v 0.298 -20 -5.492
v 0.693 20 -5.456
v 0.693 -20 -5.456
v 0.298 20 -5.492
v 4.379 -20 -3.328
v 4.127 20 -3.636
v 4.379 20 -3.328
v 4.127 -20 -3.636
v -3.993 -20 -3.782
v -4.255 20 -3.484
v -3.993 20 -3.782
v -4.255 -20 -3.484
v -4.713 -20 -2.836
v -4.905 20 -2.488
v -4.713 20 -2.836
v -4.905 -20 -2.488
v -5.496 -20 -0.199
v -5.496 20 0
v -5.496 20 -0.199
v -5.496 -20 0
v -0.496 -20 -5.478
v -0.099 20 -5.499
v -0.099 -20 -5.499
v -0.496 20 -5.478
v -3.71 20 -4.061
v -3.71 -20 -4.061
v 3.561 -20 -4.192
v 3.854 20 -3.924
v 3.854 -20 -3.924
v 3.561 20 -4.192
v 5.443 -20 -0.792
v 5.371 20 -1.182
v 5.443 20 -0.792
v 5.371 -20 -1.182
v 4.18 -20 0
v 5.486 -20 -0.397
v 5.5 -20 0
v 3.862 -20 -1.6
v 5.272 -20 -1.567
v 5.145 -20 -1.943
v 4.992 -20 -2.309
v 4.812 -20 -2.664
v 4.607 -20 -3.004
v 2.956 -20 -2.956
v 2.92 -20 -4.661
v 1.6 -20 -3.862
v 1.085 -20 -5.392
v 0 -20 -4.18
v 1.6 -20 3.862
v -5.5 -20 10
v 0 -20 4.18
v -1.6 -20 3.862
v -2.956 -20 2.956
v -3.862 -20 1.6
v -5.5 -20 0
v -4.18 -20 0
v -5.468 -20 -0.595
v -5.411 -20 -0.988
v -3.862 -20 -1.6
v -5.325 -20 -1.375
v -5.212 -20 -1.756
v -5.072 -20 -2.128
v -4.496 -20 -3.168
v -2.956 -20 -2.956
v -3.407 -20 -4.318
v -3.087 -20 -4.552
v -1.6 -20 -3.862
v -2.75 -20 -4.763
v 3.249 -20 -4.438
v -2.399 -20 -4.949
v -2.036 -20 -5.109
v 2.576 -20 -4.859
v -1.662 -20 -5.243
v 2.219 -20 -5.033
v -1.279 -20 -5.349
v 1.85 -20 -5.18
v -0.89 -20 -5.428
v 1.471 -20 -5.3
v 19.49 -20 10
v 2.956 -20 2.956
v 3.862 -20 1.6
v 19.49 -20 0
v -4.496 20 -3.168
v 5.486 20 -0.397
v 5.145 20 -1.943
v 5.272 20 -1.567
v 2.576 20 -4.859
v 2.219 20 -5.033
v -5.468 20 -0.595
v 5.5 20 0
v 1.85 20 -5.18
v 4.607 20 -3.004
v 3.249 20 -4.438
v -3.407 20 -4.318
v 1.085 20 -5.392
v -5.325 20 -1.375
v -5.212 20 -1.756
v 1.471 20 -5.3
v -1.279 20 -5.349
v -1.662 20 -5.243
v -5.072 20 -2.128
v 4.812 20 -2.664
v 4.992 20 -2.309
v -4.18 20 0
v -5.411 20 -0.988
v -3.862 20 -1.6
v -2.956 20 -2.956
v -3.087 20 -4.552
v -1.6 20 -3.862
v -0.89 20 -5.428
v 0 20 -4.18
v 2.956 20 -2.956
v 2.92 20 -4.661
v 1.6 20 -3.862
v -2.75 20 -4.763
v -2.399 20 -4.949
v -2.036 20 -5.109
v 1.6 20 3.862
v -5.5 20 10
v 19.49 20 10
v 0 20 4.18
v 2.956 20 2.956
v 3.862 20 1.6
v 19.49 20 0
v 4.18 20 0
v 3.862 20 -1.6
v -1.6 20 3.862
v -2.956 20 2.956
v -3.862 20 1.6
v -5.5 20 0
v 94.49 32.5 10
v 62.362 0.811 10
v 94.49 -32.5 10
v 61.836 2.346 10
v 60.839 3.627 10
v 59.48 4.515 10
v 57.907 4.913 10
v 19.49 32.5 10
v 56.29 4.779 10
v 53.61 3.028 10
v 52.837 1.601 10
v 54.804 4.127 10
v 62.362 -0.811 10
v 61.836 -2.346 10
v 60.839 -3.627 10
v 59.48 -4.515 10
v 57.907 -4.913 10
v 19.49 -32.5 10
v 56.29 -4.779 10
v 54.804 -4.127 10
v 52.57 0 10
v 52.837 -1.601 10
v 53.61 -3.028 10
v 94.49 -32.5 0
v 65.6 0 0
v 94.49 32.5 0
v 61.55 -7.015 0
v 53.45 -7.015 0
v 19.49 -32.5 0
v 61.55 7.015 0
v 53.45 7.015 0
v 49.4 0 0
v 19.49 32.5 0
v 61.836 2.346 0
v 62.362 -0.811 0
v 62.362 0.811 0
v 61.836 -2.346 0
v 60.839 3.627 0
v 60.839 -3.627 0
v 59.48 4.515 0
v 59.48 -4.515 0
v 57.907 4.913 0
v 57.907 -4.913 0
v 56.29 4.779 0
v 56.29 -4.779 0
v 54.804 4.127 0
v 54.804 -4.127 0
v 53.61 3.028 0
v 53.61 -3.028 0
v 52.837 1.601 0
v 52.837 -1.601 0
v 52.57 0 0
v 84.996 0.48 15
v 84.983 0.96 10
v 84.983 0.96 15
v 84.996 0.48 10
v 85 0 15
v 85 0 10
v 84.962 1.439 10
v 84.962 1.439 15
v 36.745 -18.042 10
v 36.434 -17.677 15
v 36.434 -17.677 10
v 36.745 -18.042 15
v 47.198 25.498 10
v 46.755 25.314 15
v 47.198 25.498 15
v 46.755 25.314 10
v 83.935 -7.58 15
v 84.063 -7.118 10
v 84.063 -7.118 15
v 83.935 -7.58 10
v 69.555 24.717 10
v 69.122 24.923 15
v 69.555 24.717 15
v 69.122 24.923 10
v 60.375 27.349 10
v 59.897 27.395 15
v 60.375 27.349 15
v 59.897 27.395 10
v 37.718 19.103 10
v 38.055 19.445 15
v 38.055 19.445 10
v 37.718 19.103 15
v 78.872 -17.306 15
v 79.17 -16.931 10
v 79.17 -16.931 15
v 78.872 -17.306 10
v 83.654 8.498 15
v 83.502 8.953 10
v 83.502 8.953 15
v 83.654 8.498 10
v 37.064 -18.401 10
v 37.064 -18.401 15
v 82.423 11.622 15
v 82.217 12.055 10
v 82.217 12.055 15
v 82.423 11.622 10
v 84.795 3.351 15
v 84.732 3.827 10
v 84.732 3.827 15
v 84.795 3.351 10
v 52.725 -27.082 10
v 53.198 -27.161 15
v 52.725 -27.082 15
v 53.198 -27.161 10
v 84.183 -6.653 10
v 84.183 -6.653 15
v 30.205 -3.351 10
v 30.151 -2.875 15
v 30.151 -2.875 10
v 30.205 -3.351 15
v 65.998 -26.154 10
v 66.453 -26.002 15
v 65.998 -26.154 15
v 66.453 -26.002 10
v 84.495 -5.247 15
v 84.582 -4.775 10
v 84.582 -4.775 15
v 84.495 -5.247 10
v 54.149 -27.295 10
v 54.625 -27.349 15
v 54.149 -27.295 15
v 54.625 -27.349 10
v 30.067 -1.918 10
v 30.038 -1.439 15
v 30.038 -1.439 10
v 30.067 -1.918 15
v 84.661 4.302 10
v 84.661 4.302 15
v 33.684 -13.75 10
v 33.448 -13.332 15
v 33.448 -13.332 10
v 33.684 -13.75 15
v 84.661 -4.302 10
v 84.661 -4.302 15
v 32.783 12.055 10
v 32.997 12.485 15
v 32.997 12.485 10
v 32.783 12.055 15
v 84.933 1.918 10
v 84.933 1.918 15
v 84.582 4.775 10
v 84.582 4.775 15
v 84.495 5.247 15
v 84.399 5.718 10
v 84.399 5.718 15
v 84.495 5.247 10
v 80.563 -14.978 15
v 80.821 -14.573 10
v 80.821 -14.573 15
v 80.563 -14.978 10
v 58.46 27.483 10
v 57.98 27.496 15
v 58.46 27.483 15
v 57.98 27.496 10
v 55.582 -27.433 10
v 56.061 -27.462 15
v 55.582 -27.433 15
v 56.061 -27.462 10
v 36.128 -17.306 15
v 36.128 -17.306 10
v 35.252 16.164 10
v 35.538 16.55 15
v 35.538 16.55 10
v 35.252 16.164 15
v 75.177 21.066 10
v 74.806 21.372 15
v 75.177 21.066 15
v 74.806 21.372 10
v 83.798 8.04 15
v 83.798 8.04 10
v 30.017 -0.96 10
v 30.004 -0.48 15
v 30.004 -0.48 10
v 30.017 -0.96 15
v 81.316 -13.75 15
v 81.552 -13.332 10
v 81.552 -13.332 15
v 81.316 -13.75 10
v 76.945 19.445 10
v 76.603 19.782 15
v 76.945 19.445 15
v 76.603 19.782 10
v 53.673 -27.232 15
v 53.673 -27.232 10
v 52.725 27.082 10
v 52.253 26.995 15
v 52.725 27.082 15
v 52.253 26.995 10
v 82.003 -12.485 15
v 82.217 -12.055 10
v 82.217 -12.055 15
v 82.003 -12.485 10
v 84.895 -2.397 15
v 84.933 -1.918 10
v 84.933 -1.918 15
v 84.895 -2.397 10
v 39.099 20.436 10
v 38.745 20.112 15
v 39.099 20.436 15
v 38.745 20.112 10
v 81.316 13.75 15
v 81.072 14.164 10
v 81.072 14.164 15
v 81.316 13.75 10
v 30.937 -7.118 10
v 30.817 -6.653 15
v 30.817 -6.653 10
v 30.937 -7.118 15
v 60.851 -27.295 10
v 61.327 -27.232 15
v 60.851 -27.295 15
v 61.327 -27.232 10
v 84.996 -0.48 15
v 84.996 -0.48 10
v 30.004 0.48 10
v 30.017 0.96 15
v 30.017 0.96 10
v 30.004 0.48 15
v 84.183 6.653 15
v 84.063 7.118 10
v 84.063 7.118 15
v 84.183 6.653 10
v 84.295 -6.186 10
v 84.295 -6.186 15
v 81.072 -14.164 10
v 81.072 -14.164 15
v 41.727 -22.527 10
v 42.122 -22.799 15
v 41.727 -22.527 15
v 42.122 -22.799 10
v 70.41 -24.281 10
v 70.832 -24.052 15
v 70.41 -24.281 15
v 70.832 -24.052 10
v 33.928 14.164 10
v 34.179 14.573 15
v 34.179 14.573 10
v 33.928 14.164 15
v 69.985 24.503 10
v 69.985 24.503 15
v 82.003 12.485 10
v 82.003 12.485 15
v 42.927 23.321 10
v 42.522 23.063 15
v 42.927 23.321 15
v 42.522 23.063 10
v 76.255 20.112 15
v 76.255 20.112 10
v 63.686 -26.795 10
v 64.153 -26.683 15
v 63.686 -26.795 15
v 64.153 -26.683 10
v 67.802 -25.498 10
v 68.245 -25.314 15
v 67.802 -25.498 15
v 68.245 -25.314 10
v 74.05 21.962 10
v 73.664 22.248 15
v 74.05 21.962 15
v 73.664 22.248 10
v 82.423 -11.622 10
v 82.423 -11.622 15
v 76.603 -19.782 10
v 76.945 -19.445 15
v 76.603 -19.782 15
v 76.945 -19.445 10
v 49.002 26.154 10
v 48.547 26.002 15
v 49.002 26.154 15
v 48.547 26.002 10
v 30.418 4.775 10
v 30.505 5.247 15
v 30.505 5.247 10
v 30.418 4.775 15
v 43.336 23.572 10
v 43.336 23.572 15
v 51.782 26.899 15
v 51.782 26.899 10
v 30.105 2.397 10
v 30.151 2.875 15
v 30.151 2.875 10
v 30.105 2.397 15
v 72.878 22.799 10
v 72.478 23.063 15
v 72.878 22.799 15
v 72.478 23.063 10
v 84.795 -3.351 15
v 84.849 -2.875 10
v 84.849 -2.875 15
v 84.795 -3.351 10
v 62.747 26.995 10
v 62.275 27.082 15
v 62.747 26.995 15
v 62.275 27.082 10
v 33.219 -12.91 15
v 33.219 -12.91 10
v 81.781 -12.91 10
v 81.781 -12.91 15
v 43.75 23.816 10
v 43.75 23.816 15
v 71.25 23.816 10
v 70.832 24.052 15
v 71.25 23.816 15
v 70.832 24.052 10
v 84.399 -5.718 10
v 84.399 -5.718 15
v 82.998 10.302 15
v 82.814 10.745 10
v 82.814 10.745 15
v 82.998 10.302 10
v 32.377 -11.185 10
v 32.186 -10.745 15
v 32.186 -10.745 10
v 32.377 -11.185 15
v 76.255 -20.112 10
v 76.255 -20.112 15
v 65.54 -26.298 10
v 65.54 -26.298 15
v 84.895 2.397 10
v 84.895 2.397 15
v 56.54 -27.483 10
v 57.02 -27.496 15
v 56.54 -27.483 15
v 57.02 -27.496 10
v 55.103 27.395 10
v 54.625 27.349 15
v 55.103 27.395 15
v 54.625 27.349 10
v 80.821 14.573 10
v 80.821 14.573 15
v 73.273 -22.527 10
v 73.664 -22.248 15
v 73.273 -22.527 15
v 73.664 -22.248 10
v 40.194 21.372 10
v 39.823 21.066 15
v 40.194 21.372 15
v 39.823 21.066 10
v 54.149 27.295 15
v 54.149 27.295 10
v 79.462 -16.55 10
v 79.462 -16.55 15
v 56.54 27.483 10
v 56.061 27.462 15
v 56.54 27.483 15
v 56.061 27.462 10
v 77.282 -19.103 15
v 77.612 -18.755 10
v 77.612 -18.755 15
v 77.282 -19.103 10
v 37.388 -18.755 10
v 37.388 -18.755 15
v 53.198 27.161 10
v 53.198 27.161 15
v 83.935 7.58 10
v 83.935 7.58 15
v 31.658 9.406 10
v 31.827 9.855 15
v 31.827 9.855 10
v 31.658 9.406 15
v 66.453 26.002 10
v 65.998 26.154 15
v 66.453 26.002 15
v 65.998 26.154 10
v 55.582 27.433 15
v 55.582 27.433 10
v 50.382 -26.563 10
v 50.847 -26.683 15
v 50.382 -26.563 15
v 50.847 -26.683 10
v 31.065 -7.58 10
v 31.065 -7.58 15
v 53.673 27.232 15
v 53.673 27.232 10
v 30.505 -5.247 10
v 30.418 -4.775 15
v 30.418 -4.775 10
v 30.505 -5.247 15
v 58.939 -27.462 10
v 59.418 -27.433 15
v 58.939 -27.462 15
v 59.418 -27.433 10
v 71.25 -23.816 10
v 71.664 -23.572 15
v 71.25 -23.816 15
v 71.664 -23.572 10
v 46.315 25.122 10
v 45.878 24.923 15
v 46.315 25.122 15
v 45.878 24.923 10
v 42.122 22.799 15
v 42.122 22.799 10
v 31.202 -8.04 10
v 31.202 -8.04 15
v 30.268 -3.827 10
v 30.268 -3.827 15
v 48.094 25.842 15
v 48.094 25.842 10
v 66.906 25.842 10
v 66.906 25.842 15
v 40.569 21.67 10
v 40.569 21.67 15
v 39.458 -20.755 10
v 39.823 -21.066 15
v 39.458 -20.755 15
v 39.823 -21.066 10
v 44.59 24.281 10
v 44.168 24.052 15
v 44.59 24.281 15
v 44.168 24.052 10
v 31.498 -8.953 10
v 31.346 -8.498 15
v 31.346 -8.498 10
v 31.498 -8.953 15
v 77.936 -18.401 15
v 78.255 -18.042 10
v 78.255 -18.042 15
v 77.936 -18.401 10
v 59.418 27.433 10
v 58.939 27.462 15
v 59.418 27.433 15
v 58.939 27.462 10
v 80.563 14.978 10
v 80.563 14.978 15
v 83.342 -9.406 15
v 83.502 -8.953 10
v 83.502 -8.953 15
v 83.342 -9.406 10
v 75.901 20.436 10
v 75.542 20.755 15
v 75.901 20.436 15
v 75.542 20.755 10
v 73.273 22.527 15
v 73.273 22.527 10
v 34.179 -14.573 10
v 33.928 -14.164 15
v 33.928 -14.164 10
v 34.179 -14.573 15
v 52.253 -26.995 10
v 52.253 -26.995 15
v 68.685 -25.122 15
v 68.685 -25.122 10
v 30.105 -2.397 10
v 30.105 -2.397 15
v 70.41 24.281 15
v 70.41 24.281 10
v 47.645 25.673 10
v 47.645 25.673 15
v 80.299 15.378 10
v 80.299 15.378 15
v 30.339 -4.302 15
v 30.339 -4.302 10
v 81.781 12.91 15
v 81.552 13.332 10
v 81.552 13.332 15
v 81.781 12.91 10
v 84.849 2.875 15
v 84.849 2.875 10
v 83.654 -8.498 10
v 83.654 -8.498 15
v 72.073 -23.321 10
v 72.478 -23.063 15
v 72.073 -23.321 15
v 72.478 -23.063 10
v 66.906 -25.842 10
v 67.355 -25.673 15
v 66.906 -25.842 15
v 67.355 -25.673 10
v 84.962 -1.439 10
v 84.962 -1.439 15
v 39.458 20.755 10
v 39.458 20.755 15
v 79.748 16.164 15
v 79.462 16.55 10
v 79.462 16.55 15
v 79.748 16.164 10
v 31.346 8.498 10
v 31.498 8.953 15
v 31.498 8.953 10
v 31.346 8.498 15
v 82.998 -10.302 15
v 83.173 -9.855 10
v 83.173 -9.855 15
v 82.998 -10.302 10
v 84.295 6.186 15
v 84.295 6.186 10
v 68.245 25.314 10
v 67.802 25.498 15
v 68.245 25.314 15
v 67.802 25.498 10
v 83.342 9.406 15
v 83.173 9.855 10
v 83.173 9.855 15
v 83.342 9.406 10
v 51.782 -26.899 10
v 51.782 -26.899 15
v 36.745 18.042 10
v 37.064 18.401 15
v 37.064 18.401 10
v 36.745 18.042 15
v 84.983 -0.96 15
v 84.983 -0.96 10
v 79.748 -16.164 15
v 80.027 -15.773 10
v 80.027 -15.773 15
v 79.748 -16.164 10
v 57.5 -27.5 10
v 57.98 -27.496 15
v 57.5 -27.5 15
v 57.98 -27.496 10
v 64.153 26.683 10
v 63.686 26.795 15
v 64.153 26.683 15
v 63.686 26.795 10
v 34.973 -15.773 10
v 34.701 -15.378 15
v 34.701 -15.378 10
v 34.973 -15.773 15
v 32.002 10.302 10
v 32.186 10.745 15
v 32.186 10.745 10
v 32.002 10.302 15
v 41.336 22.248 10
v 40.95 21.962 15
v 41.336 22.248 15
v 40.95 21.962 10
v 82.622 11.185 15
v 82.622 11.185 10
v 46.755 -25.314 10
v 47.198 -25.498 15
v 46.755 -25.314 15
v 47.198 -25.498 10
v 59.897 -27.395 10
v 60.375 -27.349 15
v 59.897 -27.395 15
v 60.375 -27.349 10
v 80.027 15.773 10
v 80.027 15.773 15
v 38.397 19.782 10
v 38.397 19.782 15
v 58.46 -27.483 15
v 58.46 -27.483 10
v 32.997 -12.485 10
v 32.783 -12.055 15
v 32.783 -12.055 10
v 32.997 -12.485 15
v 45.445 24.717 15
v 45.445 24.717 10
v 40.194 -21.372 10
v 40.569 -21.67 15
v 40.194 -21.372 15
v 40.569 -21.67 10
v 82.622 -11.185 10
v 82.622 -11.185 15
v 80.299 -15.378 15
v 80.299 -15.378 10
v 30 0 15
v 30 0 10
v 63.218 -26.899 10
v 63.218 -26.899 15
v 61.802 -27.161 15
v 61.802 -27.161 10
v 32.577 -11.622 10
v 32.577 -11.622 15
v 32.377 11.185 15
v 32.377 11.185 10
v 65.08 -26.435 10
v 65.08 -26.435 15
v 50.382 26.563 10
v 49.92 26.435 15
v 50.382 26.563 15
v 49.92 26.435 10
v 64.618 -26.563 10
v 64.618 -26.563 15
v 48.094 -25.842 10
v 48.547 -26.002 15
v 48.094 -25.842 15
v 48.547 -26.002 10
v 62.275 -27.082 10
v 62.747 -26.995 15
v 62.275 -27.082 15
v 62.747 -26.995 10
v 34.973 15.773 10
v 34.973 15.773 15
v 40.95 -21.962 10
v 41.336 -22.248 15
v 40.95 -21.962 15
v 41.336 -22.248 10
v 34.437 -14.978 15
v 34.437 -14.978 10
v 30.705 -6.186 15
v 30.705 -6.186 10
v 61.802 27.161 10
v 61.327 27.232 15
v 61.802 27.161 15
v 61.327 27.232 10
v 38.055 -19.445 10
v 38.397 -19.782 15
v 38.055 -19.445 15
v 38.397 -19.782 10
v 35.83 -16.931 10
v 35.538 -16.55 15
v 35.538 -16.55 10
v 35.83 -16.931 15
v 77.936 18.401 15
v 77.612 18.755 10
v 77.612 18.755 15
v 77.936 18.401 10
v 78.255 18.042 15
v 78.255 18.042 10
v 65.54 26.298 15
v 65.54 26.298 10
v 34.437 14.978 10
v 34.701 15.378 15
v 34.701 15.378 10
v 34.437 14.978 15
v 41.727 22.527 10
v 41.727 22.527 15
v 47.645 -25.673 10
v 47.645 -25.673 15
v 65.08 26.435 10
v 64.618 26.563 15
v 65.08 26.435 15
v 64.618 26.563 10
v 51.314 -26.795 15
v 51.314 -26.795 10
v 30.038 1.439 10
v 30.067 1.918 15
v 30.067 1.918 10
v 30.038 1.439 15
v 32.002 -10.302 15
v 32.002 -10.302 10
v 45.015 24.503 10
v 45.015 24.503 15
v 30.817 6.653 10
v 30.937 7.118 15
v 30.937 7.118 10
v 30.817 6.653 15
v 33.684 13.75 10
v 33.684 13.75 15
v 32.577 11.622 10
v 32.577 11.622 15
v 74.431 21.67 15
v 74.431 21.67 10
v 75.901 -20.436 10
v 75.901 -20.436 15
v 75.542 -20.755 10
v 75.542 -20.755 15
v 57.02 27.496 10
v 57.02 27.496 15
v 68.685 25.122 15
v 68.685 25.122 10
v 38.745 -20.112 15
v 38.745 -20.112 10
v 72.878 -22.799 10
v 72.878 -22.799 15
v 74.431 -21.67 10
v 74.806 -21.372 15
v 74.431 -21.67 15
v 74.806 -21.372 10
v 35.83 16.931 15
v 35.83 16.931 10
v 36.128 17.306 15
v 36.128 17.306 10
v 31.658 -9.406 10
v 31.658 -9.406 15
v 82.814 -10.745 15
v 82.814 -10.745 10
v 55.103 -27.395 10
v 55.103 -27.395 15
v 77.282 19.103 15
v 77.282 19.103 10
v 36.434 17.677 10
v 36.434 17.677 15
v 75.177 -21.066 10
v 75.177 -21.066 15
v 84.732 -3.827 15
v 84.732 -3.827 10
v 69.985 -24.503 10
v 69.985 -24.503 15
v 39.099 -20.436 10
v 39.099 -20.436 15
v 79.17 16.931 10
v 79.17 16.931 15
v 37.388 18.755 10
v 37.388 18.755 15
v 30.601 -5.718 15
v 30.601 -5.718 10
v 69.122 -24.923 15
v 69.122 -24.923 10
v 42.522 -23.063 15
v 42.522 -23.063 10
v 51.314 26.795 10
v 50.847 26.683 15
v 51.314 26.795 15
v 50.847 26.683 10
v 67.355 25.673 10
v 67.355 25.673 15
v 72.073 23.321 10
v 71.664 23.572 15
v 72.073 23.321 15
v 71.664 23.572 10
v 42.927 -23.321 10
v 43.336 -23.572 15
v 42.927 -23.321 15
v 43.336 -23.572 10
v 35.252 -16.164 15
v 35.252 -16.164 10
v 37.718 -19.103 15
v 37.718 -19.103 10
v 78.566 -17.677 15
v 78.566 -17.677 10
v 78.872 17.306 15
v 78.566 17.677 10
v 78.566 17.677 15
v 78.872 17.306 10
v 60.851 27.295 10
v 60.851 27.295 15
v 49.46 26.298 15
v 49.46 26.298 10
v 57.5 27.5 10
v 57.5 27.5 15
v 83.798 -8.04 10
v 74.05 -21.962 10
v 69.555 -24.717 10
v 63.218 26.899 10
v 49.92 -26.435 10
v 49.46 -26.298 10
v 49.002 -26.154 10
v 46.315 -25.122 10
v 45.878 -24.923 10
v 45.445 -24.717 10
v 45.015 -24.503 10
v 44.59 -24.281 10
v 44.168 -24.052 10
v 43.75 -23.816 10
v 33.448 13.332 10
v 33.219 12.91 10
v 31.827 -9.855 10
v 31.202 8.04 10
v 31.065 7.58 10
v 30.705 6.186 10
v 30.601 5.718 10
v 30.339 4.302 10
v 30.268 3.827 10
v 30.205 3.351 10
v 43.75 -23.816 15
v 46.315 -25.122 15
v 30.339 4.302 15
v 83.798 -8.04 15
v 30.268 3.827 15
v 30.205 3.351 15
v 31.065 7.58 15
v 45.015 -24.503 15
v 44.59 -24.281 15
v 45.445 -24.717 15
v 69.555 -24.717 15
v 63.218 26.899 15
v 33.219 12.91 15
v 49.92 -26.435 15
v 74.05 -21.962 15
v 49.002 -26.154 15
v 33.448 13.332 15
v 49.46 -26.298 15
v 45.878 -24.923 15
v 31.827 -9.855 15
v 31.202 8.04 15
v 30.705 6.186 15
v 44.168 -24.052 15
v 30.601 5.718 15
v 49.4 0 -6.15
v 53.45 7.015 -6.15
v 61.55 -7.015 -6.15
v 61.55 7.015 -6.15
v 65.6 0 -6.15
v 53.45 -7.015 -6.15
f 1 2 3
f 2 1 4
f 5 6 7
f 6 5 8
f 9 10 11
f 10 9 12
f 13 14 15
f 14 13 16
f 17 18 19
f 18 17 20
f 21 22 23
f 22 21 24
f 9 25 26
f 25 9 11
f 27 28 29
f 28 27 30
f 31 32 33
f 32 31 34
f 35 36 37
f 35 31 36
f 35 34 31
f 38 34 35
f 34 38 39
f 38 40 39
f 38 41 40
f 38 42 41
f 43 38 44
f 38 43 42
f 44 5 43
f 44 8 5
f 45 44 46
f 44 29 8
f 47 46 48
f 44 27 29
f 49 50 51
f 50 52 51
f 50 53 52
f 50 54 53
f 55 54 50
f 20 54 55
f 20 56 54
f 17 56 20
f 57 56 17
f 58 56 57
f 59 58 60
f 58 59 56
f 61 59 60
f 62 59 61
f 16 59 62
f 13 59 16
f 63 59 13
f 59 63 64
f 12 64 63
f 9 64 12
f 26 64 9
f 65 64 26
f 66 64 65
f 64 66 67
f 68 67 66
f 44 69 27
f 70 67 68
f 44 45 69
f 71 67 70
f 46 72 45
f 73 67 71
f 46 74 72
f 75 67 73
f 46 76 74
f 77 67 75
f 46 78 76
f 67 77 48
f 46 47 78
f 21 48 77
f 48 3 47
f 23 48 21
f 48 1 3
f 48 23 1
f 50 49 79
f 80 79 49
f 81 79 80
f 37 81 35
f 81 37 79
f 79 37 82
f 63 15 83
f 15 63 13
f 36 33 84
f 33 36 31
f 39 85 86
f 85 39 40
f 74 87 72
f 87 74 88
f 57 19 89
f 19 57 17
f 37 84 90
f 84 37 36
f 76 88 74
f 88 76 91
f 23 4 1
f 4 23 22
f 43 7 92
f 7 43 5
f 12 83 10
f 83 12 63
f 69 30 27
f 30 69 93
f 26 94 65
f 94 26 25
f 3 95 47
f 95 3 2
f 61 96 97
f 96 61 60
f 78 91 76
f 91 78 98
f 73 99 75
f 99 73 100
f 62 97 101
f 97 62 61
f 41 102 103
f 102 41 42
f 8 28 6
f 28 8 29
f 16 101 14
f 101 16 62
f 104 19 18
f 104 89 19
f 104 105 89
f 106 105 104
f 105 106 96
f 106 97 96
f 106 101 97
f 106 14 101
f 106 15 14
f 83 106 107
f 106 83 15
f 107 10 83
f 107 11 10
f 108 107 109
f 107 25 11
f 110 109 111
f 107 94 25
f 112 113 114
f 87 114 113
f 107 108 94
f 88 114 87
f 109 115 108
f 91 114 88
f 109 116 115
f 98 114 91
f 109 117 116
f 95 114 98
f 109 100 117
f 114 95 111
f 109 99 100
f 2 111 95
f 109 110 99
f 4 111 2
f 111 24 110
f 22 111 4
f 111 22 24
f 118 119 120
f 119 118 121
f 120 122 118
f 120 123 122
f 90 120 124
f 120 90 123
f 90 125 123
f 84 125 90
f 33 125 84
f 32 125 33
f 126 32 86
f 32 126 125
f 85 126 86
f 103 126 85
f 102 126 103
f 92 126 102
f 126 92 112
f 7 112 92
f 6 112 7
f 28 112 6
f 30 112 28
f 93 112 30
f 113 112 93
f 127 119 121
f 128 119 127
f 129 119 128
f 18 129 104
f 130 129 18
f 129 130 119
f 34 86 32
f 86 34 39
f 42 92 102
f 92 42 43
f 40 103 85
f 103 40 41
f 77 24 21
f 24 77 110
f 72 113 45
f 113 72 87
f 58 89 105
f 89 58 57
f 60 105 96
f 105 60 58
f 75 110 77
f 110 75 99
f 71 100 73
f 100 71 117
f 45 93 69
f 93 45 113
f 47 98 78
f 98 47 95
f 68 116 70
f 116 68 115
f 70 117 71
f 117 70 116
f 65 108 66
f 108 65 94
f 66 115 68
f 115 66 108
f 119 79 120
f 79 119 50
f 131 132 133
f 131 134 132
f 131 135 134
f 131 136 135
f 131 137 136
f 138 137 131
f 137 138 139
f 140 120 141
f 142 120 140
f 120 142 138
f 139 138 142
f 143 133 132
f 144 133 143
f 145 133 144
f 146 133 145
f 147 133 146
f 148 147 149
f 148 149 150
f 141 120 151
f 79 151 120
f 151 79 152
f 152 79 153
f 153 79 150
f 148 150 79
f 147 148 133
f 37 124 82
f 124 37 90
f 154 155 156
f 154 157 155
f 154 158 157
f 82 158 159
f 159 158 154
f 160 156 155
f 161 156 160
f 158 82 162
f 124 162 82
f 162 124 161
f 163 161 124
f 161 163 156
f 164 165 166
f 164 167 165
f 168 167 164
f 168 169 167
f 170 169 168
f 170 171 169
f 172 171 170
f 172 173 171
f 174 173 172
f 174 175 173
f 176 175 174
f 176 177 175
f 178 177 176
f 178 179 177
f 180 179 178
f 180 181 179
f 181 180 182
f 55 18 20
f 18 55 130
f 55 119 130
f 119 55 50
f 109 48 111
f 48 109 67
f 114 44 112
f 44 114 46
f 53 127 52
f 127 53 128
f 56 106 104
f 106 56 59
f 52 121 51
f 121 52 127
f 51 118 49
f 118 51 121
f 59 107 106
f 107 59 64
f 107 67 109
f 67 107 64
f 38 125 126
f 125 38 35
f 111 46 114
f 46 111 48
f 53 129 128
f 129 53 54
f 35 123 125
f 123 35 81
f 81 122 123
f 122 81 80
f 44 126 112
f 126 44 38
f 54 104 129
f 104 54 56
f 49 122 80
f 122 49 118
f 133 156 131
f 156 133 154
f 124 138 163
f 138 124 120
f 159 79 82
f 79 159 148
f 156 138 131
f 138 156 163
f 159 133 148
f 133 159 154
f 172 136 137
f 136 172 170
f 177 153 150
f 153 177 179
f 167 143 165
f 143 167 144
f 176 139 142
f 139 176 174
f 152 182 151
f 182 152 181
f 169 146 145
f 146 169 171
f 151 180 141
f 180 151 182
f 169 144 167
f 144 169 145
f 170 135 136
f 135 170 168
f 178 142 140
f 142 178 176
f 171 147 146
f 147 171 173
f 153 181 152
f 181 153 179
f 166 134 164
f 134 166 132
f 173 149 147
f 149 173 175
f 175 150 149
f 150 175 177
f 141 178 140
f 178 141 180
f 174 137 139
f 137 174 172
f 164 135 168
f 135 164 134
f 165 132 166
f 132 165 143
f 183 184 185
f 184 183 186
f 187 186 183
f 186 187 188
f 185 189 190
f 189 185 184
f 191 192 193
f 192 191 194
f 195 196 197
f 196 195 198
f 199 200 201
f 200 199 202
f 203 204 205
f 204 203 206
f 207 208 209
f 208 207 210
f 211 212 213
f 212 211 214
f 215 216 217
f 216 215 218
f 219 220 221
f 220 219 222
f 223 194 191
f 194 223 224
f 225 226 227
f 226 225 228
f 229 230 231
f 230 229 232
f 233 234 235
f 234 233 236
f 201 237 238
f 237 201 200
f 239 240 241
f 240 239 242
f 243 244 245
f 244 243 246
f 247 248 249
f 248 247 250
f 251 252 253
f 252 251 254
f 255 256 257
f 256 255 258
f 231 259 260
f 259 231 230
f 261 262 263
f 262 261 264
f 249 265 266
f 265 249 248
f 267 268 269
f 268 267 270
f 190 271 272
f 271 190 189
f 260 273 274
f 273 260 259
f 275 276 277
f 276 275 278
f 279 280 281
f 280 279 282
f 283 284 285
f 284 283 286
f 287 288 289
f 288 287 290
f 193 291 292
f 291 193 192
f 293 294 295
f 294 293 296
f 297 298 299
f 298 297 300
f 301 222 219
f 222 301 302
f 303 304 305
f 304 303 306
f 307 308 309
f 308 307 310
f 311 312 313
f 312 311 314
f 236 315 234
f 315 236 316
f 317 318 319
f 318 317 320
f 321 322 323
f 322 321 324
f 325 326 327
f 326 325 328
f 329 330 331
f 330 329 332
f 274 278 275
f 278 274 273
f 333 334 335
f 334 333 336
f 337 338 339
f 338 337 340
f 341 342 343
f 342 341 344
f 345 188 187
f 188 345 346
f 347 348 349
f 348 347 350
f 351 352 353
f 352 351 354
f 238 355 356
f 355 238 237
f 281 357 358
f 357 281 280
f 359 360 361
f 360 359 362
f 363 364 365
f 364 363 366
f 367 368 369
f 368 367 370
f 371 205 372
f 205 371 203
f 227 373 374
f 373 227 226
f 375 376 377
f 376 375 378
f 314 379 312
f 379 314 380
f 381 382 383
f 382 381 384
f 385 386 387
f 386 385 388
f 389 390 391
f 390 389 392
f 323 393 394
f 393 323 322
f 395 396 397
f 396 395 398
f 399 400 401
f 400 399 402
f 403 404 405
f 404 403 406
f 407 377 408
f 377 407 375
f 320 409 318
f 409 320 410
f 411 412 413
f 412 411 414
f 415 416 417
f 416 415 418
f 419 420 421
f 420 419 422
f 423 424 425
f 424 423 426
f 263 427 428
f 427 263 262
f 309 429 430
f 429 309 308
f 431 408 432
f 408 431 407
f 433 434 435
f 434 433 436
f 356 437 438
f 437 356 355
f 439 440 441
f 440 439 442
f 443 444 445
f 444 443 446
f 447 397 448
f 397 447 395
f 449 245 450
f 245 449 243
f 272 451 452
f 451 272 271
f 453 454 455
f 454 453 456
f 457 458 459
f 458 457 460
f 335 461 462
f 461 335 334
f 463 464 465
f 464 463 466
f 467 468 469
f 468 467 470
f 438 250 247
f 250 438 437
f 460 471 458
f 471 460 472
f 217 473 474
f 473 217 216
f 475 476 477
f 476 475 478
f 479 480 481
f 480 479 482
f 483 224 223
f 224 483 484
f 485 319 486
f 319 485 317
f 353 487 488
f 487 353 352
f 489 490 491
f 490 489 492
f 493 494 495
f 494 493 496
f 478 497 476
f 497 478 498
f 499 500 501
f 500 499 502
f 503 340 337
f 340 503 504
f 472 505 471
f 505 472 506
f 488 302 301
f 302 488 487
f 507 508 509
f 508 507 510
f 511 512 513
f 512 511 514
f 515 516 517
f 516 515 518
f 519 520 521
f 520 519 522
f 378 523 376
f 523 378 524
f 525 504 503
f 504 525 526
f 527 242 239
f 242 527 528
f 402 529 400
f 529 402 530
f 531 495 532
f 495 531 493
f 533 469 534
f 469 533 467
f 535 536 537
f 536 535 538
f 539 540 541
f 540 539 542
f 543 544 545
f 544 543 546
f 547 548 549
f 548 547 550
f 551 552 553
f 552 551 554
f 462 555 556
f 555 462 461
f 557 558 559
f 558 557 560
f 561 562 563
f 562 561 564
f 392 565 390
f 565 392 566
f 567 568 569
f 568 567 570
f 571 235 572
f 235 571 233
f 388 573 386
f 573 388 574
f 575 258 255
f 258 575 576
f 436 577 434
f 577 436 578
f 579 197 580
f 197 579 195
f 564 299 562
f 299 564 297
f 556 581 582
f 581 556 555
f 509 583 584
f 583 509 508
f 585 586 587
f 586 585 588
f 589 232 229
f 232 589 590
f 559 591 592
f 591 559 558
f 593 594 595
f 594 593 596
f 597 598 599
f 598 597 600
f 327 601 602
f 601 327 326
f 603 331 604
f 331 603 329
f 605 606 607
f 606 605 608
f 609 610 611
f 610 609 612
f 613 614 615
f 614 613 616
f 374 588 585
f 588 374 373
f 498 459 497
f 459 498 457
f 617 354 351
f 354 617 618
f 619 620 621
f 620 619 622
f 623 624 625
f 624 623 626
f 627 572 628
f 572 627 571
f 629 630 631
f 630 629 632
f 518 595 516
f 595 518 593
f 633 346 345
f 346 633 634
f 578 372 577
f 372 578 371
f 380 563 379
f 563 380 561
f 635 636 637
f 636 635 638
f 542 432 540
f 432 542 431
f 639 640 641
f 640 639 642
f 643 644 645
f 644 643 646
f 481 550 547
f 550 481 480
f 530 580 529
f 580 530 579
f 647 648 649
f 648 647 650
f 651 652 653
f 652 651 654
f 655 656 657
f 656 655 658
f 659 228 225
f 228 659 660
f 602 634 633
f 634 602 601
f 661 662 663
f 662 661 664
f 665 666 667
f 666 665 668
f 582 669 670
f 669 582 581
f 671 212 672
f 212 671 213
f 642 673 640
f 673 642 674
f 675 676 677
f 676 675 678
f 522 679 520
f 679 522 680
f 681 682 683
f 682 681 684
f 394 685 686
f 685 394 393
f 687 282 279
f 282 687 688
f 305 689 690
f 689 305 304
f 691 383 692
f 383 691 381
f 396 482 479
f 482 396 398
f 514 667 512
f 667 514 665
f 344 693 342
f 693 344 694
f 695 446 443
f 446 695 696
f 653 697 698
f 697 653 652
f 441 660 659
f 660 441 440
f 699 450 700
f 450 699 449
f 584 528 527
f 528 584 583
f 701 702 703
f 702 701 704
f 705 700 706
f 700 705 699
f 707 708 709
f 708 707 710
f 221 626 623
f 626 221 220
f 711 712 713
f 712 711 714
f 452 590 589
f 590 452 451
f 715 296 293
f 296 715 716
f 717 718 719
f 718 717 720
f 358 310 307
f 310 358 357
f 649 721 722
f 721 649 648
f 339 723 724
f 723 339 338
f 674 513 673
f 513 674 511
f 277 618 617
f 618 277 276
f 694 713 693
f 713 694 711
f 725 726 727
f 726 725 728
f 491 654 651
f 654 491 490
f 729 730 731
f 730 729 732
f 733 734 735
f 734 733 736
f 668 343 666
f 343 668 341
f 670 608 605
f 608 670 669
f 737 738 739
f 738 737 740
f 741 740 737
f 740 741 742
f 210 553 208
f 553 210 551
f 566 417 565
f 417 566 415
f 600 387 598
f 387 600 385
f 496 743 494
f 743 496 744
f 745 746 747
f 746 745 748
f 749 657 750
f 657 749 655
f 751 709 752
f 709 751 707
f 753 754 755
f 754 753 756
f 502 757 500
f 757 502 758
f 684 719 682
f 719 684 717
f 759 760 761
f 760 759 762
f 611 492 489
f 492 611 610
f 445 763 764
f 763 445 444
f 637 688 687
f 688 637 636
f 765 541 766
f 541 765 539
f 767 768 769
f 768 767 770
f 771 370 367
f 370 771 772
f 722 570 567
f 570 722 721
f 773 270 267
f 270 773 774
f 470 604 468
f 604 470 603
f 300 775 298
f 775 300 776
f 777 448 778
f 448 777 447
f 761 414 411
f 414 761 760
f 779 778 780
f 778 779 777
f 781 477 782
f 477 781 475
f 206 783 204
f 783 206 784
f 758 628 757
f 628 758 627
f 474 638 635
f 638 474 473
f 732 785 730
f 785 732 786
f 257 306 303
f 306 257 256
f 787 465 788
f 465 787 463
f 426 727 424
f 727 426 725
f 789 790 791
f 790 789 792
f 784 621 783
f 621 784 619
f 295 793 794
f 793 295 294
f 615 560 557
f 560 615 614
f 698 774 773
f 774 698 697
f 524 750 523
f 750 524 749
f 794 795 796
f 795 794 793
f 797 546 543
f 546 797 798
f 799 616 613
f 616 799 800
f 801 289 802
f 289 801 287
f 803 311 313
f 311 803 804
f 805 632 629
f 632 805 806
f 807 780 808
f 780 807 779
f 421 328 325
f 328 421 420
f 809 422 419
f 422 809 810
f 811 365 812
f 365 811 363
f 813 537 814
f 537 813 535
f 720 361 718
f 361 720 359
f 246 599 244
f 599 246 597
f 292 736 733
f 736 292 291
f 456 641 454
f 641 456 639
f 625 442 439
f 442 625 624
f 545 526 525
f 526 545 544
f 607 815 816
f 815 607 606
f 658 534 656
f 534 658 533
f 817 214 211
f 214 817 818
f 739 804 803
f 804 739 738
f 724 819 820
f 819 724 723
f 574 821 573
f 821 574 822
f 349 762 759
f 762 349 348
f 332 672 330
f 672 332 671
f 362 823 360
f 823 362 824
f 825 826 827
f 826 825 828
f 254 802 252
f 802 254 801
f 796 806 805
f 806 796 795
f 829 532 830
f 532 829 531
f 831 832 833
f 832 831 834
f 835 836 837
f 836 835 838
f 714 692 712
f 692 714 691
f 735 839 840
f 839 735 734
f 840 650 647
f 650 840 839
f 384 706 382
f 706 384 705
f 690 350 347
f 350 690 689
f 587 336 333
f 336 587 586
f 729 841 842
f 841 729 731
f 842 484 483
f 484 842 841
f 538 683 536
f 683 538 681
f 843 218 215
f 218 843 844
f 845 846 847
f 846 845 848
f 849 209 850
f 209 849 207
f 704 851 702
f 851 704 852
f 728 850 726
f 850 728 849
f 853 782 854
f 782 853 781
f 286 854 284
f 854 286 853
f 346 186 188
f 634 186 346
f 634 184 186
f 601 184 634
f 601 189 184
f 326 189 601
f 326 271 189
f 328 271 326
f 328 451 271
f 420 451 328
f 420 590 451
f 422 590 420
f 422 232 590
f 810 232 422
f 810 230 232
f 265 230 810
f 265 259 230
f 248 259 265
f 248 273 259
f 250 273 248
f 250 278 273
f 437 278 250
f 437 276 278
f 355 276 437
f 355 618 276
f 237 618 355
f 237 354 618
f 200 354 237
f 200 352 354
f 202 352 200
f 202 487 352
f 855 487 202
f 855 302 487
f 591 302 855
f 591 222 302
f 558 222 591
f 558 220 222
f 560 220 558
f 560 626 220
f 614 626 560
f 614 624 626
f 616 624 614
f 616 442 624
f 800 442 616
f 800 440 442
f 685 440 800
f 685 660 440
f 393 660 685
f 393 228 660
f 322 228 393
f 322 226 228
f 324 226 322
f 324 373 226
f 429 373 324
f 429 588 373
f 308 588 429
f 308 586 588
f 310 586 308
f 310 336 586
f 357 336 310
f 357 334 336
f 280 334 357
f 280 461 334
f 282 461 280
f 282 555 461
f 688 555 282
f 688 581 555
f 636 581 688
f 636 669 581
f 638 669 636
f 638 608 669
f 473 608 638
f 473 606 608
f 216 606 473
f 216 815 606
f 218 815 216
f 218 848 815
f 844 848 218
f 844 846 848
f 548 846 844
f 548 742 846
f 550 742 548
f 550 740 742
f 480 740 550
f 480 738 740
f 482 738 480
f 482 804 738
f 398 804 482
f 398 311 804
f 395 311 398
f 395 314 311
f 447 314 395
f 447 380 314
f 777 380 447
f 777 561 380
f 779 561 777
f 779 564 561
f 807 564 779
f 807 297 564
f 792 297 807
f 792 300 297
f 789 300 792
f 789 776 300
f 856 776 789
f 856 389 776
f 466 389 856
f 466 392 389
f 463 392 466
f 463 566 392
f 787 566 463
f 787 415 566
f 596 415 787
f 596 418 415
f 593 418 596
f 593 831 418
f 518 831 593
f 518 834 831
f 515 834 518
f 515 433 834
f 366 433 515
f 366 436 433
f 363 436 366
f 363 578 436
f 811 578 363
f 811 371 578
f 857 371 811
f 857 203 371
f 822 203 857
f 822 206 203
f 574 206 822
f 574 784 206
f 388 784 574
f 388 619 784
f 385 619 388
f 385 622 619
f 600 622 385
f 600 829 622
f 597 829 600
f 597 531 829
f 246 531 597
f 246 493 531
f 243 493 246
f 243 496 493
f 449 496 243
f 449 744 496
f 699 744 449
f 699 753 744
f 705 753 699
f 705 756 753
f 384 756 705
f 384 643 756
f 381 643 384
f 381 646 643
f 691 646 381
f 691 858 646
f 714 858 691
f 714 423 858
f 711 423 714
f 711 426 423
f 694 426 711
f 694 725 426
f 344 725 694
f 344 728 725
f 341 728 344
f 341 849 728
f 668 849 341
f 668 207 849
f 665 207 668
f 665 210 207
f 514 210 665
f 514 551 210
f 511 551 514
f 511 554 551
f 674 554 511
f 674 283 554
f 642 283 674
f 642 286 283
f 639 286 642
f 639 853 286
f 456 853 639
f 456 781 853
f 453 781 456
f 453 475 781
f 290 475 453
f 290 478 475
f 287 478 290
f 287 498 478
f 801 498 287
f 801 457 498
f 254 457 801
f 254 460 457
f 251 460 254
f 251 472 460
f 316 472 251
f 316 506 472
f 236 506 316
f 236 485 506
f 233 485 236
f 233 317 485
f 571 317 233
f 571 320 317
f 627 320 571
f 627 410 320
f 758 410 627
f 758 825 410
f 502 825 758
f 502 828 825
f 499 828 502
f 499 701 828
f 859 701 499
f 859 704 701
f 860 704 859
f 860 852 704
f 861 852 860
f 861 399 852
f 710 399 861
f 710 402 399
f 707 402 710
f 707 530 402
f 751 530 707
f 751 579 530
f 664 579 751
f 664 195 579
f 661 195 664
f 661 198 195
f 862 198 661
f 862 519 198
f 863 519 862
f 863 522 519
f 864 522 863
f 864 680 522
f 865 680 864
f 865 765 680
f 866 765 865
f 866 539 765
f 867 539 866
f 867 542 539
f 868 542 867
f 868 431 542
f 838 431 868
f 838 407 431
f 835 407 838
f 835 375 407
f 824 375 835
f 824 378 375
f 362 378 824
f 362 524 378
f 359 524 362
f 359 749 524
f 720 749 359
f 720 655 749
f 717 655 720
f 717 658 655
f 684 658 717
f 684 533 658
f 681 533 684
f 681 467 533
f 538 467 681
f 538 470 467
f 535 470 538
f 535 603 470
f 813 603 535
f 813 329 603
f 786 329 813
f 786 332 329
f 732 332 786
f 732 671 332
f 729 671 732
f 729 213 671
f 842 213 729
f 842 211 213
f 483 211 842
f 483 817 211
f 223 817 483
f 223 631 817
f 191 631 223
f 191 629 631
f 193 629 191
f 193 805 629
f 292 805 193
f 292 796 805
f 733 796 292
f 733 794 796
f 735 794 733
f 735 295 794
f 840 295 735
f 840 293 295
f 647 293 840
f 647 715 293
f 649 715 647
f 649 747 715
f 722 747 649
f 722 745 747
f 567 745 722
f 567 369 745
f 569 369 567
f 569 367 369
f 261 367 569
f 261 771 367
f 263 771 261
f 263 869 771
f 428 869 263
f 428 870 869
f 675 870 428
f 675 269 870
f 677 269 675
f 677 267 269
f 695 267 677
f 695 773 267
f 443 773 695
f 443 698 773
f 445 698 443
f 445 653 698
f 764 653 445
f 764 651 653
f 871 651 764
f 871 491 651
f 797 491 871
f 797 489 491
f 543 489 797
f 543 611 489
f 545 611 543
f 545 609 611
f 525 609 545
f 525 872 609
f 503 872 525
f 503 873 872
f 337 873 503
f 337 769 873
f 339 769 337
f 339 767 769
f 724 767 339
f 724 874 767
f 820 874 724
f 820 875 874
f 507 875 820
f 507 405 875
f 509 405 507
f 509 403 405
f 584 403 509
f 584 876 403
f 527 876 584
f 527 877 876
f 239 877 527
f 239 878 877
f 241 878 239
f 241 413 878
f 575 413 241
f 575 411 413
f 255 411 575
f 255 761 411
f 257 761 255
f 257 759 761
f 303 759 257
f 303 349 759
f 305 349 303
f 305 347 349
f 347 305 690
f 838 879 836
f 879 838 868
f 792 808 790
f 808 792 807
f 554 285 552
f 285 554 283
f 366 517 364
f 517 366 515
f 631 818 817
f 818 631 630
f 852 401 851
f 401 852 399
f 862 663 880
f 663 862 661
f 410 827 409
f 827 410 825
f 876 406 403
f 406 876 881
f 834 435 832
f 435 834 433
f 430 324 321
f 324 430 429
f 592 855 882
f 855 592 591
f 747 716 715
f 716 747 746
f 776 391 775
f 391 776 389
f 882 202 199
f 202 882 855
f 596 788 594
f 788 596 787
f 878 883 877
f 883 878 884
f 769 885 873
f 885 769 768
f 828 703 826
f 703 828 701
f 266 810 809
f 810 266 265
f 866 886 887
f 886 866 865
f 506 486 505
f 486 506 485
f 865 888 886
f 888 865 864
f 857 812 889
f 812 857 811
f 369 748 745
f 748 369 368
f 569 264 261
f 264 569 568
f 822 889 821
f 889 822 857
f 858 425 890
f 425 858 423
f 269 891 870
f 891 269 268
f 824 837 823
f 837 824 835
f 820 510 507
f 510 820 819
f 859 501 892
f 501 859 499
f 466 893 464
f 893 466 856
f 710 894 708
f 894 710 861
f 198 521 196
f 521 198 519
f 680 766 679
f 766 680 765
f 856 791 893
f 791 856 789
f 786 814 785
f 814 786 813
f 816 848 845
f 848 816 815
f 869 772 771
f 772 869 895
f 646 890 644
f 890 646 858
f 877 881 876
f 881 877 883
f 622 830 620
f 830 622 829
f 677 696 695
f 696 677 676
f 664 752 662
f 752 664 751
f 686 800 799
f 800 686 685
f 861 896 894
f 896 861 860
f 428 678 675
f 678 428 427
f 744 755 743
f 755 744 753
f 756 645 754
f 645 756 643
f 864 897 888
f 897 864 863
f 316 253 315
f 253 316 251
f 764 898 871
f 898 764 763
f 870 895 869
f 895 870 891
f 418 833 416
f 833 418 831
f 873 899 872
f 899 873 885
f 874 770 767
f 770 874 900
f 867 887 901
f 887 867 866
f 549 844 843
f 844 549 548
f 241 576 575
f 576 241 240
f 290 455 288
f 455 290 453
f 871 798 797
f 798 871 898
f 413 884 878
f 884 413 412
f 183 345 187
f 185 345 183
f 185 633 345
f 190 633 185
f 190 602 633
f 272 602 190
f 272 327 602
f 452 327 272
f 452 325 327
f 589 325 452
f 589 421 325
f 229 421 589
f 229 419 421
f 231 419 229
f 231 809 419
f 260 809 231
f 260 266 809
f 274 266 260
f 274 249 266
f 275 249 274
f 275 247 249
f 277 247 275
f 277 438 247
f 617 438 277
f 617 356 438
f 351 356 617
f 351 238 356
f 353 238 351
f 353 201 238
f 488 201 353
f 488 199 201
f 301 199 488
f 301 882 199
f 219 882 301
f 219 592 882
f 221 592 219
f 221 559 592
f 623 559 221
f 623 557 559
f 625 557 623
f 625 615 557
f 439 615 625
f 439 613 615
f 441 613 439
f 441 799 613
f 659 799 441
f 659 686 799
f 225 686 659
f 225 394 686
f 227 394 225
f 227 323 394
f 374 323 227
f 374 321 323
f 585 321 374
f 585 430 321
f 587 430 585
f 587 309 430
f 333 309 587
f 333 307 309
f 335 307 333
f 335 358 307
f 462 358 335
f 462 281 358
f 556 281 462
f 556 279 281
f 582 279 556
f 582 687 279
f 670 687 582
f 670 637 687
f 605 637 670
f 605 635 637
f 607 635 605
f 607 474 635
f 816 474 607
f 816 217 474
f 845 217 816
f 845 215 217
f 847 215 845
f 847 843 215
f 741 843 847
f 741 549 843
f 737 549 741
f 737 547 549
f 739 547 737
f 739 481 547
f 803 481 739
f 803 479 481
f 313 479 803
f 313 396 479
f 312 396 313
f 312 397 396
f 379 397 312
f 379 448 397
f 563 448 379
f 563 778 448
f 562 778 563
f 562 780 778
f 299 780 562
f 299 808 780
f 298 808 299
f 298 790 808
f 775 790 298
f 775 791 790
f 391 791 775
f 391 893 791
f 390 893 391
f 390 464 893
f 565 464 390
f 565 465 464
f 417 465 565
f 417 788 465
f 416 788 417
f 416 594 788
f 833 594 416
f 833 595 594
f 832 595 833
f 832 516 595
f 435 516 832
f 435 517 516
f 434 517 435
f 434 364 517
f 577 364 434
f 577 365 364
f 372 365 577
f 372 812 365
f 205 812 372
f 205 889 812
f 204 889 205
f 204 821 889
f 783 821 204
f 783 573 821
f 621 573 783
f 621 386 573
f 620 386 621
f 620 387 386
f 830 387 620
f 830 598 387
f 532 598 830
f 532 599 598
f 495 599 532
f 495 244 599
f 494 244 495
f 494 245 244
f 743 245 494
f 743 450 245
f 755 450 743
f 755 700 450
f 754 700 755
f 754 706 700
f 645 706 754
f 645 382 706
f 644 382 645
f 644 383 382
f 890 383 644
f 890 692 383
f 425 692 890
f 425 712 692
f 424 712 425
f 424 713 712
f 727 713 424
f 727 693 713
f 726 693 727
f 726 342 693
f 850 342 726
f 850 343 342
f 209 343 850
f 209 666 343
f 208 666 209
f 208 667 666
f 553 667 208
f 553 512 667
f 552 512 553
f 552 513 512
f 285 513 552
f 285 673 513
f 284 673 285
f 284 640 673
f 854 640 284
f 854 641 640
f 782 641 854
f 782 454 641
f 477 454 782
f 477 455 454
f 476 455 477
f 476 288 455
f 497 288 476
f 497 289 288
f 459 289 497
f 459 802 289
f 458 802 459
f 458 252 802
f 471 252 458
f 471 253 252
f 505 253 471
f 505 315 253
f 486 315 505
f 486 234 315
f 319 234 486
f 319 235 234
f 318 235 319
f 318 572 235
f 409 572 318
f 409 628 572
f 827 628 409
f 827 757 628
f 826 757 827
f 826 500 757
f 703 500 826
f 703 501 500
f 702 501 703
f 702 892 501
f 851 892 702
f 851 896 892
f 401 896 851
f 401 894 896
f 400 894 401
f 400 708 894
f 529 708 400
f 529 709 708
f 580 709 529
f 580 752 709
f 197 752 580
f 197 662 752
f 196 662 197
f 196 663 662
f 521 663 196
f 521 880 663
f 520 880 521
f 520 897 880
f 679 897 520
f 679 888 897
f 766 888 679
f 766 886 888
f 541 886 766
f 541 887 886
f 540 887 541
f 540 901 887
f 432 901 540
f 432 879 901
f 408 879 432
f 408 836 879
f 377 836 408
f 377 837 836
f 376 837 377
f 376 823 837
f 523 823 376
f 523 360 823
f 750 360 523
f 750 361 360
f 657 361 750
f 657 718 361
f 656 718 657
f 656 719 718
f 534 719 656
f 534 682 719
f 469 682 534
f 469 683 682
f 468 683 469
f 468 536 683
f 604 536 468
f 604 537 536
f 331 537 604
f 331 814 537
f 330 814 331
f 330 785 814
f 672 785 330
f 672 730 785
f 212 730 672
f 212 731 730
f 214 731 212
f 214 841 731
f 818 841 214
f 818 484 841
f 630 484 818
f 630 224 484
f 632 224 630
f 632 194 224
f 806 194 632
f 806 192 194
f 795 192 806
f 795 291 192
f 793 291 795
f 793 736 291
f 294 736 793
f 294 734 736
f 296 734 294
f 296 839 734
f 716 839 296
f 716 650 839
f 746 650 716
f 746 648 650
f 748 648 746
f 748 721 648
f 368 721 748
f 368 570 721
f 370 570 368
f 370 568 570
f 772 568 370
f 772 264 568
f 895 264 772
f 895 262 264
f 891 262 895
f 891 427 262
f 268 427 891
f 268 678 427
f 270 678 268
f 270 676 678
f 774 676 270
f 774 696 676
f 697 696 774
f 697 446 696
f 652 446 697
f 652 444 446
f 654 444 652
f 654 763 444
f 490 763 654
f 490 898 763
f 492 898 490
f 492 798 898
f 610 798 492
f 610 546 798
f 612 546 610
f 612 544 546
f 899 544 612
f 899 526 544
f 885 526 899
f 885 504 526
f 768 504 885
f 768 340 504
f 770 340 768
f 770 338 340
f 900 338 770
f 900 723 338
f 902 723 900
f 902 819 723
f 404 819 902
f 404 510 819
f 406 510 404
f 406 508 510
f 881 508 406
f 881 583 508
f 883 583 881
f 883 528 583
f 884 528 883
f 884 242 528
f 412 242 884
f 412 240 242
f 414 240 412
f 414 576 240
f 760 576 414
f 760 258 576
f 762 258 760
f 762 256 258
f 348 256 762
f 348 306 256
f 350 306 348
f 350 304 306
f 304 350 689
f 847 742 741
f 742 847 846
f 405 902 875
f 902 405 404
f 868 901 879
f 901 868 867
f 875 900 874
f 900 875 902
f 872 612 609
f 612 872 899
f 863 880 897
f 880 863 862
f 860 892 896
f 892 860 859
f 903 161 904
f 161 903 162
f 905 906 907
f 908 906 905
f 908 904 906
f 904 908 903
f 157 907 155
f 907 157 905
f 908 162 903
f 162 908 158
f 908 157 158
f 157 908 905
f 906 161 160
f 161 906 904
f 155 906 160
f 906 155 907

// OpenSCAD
use <MCAD/2Dshapes.scad>
use <MCAD/regular_shapes.scad>
use <MCAD/boxes.scad>
use <MCAD/nuts_and_bolts.scad>
use <MCAD/polyholes.scad>

$fa = 1;
$fs = 0.4;


/* Geometric conventions:

   - the rotation axis of the whole tracker is the Y axis

   - the upper plate stays above the XY plane (Z>0)

   - the lower plate stays below the XY plane (Z<0)
*/

// screw size
M8 = 8;
PH14 = 6.35;  // photographic 1/4" screw ==> 6.35 mm
PH38 = 9.525; // photographic 3/8" screw ==> 9.525 mm

TOL = 0.2;

// geometry of the tracker
LENGTH = 100;         // X axis
WIDTH = 65;           // Y axis
UPPER_THICKNESS = 10; // Z axis
LOWER_THICKNESS = 10; // Z axis

HINGE_W = 40;
HINGE_THICKNESS = 3;

BALL_D = 55; // ball head diameter
BALL_X = 25 + 5 + BALL_D/2; // ball head X coordinate

module upper_plate(ball_head=false) {
    X = LENGTH;
    Y = WIDTH;
    Z = UPPER_THICKNESS;

    H_out_d = M8 + HINGE_THICKNESS;
    H_in_d = M8 + TOL;

    // inner hinge
    difference() {
        union() {
            color("#F00")
                rotate([90, 0, 0]) cylinder(d=H_out_d, h=HINGE_W, center=true);
            color("#F55", 0.9)
                translate([-H_out_d/2, -HINGE_W/2, 0]) cube([25, HINGE_W, Z]);
        }
         translate([0, HINGE_W/2+0.01, 0]) rotate([90, 0, 0]) polyhole(HINGE_W+0.02, H_in_d);
    }

    // rest of the plate
    difference() {
        color("#F88")
            translate([25-H_out_d/2-0.01, -Y/2, 0]) cube([X-25, Y, Z]);
        // hole for the ball head
        translate([BALL_X, 0, -0.002]) polyhole(Z+0.004, PH38+TOL);
    }

    if (ball_head) {
        color("grey")
            translate([BALL_X, 0, Z+0.0001]) cylinder(d=BALL_D, h=5);

        color("grey")
            translate([BALL_X, 0, -6.15]) PH38_bolt_head();
    }
}

module PH38_bolt_head() {
    linear_extrude(6.15) hexagon(16.20/2);
}


rotate([0, -90*$t, 0]) upper_plate(ball_head=true);
